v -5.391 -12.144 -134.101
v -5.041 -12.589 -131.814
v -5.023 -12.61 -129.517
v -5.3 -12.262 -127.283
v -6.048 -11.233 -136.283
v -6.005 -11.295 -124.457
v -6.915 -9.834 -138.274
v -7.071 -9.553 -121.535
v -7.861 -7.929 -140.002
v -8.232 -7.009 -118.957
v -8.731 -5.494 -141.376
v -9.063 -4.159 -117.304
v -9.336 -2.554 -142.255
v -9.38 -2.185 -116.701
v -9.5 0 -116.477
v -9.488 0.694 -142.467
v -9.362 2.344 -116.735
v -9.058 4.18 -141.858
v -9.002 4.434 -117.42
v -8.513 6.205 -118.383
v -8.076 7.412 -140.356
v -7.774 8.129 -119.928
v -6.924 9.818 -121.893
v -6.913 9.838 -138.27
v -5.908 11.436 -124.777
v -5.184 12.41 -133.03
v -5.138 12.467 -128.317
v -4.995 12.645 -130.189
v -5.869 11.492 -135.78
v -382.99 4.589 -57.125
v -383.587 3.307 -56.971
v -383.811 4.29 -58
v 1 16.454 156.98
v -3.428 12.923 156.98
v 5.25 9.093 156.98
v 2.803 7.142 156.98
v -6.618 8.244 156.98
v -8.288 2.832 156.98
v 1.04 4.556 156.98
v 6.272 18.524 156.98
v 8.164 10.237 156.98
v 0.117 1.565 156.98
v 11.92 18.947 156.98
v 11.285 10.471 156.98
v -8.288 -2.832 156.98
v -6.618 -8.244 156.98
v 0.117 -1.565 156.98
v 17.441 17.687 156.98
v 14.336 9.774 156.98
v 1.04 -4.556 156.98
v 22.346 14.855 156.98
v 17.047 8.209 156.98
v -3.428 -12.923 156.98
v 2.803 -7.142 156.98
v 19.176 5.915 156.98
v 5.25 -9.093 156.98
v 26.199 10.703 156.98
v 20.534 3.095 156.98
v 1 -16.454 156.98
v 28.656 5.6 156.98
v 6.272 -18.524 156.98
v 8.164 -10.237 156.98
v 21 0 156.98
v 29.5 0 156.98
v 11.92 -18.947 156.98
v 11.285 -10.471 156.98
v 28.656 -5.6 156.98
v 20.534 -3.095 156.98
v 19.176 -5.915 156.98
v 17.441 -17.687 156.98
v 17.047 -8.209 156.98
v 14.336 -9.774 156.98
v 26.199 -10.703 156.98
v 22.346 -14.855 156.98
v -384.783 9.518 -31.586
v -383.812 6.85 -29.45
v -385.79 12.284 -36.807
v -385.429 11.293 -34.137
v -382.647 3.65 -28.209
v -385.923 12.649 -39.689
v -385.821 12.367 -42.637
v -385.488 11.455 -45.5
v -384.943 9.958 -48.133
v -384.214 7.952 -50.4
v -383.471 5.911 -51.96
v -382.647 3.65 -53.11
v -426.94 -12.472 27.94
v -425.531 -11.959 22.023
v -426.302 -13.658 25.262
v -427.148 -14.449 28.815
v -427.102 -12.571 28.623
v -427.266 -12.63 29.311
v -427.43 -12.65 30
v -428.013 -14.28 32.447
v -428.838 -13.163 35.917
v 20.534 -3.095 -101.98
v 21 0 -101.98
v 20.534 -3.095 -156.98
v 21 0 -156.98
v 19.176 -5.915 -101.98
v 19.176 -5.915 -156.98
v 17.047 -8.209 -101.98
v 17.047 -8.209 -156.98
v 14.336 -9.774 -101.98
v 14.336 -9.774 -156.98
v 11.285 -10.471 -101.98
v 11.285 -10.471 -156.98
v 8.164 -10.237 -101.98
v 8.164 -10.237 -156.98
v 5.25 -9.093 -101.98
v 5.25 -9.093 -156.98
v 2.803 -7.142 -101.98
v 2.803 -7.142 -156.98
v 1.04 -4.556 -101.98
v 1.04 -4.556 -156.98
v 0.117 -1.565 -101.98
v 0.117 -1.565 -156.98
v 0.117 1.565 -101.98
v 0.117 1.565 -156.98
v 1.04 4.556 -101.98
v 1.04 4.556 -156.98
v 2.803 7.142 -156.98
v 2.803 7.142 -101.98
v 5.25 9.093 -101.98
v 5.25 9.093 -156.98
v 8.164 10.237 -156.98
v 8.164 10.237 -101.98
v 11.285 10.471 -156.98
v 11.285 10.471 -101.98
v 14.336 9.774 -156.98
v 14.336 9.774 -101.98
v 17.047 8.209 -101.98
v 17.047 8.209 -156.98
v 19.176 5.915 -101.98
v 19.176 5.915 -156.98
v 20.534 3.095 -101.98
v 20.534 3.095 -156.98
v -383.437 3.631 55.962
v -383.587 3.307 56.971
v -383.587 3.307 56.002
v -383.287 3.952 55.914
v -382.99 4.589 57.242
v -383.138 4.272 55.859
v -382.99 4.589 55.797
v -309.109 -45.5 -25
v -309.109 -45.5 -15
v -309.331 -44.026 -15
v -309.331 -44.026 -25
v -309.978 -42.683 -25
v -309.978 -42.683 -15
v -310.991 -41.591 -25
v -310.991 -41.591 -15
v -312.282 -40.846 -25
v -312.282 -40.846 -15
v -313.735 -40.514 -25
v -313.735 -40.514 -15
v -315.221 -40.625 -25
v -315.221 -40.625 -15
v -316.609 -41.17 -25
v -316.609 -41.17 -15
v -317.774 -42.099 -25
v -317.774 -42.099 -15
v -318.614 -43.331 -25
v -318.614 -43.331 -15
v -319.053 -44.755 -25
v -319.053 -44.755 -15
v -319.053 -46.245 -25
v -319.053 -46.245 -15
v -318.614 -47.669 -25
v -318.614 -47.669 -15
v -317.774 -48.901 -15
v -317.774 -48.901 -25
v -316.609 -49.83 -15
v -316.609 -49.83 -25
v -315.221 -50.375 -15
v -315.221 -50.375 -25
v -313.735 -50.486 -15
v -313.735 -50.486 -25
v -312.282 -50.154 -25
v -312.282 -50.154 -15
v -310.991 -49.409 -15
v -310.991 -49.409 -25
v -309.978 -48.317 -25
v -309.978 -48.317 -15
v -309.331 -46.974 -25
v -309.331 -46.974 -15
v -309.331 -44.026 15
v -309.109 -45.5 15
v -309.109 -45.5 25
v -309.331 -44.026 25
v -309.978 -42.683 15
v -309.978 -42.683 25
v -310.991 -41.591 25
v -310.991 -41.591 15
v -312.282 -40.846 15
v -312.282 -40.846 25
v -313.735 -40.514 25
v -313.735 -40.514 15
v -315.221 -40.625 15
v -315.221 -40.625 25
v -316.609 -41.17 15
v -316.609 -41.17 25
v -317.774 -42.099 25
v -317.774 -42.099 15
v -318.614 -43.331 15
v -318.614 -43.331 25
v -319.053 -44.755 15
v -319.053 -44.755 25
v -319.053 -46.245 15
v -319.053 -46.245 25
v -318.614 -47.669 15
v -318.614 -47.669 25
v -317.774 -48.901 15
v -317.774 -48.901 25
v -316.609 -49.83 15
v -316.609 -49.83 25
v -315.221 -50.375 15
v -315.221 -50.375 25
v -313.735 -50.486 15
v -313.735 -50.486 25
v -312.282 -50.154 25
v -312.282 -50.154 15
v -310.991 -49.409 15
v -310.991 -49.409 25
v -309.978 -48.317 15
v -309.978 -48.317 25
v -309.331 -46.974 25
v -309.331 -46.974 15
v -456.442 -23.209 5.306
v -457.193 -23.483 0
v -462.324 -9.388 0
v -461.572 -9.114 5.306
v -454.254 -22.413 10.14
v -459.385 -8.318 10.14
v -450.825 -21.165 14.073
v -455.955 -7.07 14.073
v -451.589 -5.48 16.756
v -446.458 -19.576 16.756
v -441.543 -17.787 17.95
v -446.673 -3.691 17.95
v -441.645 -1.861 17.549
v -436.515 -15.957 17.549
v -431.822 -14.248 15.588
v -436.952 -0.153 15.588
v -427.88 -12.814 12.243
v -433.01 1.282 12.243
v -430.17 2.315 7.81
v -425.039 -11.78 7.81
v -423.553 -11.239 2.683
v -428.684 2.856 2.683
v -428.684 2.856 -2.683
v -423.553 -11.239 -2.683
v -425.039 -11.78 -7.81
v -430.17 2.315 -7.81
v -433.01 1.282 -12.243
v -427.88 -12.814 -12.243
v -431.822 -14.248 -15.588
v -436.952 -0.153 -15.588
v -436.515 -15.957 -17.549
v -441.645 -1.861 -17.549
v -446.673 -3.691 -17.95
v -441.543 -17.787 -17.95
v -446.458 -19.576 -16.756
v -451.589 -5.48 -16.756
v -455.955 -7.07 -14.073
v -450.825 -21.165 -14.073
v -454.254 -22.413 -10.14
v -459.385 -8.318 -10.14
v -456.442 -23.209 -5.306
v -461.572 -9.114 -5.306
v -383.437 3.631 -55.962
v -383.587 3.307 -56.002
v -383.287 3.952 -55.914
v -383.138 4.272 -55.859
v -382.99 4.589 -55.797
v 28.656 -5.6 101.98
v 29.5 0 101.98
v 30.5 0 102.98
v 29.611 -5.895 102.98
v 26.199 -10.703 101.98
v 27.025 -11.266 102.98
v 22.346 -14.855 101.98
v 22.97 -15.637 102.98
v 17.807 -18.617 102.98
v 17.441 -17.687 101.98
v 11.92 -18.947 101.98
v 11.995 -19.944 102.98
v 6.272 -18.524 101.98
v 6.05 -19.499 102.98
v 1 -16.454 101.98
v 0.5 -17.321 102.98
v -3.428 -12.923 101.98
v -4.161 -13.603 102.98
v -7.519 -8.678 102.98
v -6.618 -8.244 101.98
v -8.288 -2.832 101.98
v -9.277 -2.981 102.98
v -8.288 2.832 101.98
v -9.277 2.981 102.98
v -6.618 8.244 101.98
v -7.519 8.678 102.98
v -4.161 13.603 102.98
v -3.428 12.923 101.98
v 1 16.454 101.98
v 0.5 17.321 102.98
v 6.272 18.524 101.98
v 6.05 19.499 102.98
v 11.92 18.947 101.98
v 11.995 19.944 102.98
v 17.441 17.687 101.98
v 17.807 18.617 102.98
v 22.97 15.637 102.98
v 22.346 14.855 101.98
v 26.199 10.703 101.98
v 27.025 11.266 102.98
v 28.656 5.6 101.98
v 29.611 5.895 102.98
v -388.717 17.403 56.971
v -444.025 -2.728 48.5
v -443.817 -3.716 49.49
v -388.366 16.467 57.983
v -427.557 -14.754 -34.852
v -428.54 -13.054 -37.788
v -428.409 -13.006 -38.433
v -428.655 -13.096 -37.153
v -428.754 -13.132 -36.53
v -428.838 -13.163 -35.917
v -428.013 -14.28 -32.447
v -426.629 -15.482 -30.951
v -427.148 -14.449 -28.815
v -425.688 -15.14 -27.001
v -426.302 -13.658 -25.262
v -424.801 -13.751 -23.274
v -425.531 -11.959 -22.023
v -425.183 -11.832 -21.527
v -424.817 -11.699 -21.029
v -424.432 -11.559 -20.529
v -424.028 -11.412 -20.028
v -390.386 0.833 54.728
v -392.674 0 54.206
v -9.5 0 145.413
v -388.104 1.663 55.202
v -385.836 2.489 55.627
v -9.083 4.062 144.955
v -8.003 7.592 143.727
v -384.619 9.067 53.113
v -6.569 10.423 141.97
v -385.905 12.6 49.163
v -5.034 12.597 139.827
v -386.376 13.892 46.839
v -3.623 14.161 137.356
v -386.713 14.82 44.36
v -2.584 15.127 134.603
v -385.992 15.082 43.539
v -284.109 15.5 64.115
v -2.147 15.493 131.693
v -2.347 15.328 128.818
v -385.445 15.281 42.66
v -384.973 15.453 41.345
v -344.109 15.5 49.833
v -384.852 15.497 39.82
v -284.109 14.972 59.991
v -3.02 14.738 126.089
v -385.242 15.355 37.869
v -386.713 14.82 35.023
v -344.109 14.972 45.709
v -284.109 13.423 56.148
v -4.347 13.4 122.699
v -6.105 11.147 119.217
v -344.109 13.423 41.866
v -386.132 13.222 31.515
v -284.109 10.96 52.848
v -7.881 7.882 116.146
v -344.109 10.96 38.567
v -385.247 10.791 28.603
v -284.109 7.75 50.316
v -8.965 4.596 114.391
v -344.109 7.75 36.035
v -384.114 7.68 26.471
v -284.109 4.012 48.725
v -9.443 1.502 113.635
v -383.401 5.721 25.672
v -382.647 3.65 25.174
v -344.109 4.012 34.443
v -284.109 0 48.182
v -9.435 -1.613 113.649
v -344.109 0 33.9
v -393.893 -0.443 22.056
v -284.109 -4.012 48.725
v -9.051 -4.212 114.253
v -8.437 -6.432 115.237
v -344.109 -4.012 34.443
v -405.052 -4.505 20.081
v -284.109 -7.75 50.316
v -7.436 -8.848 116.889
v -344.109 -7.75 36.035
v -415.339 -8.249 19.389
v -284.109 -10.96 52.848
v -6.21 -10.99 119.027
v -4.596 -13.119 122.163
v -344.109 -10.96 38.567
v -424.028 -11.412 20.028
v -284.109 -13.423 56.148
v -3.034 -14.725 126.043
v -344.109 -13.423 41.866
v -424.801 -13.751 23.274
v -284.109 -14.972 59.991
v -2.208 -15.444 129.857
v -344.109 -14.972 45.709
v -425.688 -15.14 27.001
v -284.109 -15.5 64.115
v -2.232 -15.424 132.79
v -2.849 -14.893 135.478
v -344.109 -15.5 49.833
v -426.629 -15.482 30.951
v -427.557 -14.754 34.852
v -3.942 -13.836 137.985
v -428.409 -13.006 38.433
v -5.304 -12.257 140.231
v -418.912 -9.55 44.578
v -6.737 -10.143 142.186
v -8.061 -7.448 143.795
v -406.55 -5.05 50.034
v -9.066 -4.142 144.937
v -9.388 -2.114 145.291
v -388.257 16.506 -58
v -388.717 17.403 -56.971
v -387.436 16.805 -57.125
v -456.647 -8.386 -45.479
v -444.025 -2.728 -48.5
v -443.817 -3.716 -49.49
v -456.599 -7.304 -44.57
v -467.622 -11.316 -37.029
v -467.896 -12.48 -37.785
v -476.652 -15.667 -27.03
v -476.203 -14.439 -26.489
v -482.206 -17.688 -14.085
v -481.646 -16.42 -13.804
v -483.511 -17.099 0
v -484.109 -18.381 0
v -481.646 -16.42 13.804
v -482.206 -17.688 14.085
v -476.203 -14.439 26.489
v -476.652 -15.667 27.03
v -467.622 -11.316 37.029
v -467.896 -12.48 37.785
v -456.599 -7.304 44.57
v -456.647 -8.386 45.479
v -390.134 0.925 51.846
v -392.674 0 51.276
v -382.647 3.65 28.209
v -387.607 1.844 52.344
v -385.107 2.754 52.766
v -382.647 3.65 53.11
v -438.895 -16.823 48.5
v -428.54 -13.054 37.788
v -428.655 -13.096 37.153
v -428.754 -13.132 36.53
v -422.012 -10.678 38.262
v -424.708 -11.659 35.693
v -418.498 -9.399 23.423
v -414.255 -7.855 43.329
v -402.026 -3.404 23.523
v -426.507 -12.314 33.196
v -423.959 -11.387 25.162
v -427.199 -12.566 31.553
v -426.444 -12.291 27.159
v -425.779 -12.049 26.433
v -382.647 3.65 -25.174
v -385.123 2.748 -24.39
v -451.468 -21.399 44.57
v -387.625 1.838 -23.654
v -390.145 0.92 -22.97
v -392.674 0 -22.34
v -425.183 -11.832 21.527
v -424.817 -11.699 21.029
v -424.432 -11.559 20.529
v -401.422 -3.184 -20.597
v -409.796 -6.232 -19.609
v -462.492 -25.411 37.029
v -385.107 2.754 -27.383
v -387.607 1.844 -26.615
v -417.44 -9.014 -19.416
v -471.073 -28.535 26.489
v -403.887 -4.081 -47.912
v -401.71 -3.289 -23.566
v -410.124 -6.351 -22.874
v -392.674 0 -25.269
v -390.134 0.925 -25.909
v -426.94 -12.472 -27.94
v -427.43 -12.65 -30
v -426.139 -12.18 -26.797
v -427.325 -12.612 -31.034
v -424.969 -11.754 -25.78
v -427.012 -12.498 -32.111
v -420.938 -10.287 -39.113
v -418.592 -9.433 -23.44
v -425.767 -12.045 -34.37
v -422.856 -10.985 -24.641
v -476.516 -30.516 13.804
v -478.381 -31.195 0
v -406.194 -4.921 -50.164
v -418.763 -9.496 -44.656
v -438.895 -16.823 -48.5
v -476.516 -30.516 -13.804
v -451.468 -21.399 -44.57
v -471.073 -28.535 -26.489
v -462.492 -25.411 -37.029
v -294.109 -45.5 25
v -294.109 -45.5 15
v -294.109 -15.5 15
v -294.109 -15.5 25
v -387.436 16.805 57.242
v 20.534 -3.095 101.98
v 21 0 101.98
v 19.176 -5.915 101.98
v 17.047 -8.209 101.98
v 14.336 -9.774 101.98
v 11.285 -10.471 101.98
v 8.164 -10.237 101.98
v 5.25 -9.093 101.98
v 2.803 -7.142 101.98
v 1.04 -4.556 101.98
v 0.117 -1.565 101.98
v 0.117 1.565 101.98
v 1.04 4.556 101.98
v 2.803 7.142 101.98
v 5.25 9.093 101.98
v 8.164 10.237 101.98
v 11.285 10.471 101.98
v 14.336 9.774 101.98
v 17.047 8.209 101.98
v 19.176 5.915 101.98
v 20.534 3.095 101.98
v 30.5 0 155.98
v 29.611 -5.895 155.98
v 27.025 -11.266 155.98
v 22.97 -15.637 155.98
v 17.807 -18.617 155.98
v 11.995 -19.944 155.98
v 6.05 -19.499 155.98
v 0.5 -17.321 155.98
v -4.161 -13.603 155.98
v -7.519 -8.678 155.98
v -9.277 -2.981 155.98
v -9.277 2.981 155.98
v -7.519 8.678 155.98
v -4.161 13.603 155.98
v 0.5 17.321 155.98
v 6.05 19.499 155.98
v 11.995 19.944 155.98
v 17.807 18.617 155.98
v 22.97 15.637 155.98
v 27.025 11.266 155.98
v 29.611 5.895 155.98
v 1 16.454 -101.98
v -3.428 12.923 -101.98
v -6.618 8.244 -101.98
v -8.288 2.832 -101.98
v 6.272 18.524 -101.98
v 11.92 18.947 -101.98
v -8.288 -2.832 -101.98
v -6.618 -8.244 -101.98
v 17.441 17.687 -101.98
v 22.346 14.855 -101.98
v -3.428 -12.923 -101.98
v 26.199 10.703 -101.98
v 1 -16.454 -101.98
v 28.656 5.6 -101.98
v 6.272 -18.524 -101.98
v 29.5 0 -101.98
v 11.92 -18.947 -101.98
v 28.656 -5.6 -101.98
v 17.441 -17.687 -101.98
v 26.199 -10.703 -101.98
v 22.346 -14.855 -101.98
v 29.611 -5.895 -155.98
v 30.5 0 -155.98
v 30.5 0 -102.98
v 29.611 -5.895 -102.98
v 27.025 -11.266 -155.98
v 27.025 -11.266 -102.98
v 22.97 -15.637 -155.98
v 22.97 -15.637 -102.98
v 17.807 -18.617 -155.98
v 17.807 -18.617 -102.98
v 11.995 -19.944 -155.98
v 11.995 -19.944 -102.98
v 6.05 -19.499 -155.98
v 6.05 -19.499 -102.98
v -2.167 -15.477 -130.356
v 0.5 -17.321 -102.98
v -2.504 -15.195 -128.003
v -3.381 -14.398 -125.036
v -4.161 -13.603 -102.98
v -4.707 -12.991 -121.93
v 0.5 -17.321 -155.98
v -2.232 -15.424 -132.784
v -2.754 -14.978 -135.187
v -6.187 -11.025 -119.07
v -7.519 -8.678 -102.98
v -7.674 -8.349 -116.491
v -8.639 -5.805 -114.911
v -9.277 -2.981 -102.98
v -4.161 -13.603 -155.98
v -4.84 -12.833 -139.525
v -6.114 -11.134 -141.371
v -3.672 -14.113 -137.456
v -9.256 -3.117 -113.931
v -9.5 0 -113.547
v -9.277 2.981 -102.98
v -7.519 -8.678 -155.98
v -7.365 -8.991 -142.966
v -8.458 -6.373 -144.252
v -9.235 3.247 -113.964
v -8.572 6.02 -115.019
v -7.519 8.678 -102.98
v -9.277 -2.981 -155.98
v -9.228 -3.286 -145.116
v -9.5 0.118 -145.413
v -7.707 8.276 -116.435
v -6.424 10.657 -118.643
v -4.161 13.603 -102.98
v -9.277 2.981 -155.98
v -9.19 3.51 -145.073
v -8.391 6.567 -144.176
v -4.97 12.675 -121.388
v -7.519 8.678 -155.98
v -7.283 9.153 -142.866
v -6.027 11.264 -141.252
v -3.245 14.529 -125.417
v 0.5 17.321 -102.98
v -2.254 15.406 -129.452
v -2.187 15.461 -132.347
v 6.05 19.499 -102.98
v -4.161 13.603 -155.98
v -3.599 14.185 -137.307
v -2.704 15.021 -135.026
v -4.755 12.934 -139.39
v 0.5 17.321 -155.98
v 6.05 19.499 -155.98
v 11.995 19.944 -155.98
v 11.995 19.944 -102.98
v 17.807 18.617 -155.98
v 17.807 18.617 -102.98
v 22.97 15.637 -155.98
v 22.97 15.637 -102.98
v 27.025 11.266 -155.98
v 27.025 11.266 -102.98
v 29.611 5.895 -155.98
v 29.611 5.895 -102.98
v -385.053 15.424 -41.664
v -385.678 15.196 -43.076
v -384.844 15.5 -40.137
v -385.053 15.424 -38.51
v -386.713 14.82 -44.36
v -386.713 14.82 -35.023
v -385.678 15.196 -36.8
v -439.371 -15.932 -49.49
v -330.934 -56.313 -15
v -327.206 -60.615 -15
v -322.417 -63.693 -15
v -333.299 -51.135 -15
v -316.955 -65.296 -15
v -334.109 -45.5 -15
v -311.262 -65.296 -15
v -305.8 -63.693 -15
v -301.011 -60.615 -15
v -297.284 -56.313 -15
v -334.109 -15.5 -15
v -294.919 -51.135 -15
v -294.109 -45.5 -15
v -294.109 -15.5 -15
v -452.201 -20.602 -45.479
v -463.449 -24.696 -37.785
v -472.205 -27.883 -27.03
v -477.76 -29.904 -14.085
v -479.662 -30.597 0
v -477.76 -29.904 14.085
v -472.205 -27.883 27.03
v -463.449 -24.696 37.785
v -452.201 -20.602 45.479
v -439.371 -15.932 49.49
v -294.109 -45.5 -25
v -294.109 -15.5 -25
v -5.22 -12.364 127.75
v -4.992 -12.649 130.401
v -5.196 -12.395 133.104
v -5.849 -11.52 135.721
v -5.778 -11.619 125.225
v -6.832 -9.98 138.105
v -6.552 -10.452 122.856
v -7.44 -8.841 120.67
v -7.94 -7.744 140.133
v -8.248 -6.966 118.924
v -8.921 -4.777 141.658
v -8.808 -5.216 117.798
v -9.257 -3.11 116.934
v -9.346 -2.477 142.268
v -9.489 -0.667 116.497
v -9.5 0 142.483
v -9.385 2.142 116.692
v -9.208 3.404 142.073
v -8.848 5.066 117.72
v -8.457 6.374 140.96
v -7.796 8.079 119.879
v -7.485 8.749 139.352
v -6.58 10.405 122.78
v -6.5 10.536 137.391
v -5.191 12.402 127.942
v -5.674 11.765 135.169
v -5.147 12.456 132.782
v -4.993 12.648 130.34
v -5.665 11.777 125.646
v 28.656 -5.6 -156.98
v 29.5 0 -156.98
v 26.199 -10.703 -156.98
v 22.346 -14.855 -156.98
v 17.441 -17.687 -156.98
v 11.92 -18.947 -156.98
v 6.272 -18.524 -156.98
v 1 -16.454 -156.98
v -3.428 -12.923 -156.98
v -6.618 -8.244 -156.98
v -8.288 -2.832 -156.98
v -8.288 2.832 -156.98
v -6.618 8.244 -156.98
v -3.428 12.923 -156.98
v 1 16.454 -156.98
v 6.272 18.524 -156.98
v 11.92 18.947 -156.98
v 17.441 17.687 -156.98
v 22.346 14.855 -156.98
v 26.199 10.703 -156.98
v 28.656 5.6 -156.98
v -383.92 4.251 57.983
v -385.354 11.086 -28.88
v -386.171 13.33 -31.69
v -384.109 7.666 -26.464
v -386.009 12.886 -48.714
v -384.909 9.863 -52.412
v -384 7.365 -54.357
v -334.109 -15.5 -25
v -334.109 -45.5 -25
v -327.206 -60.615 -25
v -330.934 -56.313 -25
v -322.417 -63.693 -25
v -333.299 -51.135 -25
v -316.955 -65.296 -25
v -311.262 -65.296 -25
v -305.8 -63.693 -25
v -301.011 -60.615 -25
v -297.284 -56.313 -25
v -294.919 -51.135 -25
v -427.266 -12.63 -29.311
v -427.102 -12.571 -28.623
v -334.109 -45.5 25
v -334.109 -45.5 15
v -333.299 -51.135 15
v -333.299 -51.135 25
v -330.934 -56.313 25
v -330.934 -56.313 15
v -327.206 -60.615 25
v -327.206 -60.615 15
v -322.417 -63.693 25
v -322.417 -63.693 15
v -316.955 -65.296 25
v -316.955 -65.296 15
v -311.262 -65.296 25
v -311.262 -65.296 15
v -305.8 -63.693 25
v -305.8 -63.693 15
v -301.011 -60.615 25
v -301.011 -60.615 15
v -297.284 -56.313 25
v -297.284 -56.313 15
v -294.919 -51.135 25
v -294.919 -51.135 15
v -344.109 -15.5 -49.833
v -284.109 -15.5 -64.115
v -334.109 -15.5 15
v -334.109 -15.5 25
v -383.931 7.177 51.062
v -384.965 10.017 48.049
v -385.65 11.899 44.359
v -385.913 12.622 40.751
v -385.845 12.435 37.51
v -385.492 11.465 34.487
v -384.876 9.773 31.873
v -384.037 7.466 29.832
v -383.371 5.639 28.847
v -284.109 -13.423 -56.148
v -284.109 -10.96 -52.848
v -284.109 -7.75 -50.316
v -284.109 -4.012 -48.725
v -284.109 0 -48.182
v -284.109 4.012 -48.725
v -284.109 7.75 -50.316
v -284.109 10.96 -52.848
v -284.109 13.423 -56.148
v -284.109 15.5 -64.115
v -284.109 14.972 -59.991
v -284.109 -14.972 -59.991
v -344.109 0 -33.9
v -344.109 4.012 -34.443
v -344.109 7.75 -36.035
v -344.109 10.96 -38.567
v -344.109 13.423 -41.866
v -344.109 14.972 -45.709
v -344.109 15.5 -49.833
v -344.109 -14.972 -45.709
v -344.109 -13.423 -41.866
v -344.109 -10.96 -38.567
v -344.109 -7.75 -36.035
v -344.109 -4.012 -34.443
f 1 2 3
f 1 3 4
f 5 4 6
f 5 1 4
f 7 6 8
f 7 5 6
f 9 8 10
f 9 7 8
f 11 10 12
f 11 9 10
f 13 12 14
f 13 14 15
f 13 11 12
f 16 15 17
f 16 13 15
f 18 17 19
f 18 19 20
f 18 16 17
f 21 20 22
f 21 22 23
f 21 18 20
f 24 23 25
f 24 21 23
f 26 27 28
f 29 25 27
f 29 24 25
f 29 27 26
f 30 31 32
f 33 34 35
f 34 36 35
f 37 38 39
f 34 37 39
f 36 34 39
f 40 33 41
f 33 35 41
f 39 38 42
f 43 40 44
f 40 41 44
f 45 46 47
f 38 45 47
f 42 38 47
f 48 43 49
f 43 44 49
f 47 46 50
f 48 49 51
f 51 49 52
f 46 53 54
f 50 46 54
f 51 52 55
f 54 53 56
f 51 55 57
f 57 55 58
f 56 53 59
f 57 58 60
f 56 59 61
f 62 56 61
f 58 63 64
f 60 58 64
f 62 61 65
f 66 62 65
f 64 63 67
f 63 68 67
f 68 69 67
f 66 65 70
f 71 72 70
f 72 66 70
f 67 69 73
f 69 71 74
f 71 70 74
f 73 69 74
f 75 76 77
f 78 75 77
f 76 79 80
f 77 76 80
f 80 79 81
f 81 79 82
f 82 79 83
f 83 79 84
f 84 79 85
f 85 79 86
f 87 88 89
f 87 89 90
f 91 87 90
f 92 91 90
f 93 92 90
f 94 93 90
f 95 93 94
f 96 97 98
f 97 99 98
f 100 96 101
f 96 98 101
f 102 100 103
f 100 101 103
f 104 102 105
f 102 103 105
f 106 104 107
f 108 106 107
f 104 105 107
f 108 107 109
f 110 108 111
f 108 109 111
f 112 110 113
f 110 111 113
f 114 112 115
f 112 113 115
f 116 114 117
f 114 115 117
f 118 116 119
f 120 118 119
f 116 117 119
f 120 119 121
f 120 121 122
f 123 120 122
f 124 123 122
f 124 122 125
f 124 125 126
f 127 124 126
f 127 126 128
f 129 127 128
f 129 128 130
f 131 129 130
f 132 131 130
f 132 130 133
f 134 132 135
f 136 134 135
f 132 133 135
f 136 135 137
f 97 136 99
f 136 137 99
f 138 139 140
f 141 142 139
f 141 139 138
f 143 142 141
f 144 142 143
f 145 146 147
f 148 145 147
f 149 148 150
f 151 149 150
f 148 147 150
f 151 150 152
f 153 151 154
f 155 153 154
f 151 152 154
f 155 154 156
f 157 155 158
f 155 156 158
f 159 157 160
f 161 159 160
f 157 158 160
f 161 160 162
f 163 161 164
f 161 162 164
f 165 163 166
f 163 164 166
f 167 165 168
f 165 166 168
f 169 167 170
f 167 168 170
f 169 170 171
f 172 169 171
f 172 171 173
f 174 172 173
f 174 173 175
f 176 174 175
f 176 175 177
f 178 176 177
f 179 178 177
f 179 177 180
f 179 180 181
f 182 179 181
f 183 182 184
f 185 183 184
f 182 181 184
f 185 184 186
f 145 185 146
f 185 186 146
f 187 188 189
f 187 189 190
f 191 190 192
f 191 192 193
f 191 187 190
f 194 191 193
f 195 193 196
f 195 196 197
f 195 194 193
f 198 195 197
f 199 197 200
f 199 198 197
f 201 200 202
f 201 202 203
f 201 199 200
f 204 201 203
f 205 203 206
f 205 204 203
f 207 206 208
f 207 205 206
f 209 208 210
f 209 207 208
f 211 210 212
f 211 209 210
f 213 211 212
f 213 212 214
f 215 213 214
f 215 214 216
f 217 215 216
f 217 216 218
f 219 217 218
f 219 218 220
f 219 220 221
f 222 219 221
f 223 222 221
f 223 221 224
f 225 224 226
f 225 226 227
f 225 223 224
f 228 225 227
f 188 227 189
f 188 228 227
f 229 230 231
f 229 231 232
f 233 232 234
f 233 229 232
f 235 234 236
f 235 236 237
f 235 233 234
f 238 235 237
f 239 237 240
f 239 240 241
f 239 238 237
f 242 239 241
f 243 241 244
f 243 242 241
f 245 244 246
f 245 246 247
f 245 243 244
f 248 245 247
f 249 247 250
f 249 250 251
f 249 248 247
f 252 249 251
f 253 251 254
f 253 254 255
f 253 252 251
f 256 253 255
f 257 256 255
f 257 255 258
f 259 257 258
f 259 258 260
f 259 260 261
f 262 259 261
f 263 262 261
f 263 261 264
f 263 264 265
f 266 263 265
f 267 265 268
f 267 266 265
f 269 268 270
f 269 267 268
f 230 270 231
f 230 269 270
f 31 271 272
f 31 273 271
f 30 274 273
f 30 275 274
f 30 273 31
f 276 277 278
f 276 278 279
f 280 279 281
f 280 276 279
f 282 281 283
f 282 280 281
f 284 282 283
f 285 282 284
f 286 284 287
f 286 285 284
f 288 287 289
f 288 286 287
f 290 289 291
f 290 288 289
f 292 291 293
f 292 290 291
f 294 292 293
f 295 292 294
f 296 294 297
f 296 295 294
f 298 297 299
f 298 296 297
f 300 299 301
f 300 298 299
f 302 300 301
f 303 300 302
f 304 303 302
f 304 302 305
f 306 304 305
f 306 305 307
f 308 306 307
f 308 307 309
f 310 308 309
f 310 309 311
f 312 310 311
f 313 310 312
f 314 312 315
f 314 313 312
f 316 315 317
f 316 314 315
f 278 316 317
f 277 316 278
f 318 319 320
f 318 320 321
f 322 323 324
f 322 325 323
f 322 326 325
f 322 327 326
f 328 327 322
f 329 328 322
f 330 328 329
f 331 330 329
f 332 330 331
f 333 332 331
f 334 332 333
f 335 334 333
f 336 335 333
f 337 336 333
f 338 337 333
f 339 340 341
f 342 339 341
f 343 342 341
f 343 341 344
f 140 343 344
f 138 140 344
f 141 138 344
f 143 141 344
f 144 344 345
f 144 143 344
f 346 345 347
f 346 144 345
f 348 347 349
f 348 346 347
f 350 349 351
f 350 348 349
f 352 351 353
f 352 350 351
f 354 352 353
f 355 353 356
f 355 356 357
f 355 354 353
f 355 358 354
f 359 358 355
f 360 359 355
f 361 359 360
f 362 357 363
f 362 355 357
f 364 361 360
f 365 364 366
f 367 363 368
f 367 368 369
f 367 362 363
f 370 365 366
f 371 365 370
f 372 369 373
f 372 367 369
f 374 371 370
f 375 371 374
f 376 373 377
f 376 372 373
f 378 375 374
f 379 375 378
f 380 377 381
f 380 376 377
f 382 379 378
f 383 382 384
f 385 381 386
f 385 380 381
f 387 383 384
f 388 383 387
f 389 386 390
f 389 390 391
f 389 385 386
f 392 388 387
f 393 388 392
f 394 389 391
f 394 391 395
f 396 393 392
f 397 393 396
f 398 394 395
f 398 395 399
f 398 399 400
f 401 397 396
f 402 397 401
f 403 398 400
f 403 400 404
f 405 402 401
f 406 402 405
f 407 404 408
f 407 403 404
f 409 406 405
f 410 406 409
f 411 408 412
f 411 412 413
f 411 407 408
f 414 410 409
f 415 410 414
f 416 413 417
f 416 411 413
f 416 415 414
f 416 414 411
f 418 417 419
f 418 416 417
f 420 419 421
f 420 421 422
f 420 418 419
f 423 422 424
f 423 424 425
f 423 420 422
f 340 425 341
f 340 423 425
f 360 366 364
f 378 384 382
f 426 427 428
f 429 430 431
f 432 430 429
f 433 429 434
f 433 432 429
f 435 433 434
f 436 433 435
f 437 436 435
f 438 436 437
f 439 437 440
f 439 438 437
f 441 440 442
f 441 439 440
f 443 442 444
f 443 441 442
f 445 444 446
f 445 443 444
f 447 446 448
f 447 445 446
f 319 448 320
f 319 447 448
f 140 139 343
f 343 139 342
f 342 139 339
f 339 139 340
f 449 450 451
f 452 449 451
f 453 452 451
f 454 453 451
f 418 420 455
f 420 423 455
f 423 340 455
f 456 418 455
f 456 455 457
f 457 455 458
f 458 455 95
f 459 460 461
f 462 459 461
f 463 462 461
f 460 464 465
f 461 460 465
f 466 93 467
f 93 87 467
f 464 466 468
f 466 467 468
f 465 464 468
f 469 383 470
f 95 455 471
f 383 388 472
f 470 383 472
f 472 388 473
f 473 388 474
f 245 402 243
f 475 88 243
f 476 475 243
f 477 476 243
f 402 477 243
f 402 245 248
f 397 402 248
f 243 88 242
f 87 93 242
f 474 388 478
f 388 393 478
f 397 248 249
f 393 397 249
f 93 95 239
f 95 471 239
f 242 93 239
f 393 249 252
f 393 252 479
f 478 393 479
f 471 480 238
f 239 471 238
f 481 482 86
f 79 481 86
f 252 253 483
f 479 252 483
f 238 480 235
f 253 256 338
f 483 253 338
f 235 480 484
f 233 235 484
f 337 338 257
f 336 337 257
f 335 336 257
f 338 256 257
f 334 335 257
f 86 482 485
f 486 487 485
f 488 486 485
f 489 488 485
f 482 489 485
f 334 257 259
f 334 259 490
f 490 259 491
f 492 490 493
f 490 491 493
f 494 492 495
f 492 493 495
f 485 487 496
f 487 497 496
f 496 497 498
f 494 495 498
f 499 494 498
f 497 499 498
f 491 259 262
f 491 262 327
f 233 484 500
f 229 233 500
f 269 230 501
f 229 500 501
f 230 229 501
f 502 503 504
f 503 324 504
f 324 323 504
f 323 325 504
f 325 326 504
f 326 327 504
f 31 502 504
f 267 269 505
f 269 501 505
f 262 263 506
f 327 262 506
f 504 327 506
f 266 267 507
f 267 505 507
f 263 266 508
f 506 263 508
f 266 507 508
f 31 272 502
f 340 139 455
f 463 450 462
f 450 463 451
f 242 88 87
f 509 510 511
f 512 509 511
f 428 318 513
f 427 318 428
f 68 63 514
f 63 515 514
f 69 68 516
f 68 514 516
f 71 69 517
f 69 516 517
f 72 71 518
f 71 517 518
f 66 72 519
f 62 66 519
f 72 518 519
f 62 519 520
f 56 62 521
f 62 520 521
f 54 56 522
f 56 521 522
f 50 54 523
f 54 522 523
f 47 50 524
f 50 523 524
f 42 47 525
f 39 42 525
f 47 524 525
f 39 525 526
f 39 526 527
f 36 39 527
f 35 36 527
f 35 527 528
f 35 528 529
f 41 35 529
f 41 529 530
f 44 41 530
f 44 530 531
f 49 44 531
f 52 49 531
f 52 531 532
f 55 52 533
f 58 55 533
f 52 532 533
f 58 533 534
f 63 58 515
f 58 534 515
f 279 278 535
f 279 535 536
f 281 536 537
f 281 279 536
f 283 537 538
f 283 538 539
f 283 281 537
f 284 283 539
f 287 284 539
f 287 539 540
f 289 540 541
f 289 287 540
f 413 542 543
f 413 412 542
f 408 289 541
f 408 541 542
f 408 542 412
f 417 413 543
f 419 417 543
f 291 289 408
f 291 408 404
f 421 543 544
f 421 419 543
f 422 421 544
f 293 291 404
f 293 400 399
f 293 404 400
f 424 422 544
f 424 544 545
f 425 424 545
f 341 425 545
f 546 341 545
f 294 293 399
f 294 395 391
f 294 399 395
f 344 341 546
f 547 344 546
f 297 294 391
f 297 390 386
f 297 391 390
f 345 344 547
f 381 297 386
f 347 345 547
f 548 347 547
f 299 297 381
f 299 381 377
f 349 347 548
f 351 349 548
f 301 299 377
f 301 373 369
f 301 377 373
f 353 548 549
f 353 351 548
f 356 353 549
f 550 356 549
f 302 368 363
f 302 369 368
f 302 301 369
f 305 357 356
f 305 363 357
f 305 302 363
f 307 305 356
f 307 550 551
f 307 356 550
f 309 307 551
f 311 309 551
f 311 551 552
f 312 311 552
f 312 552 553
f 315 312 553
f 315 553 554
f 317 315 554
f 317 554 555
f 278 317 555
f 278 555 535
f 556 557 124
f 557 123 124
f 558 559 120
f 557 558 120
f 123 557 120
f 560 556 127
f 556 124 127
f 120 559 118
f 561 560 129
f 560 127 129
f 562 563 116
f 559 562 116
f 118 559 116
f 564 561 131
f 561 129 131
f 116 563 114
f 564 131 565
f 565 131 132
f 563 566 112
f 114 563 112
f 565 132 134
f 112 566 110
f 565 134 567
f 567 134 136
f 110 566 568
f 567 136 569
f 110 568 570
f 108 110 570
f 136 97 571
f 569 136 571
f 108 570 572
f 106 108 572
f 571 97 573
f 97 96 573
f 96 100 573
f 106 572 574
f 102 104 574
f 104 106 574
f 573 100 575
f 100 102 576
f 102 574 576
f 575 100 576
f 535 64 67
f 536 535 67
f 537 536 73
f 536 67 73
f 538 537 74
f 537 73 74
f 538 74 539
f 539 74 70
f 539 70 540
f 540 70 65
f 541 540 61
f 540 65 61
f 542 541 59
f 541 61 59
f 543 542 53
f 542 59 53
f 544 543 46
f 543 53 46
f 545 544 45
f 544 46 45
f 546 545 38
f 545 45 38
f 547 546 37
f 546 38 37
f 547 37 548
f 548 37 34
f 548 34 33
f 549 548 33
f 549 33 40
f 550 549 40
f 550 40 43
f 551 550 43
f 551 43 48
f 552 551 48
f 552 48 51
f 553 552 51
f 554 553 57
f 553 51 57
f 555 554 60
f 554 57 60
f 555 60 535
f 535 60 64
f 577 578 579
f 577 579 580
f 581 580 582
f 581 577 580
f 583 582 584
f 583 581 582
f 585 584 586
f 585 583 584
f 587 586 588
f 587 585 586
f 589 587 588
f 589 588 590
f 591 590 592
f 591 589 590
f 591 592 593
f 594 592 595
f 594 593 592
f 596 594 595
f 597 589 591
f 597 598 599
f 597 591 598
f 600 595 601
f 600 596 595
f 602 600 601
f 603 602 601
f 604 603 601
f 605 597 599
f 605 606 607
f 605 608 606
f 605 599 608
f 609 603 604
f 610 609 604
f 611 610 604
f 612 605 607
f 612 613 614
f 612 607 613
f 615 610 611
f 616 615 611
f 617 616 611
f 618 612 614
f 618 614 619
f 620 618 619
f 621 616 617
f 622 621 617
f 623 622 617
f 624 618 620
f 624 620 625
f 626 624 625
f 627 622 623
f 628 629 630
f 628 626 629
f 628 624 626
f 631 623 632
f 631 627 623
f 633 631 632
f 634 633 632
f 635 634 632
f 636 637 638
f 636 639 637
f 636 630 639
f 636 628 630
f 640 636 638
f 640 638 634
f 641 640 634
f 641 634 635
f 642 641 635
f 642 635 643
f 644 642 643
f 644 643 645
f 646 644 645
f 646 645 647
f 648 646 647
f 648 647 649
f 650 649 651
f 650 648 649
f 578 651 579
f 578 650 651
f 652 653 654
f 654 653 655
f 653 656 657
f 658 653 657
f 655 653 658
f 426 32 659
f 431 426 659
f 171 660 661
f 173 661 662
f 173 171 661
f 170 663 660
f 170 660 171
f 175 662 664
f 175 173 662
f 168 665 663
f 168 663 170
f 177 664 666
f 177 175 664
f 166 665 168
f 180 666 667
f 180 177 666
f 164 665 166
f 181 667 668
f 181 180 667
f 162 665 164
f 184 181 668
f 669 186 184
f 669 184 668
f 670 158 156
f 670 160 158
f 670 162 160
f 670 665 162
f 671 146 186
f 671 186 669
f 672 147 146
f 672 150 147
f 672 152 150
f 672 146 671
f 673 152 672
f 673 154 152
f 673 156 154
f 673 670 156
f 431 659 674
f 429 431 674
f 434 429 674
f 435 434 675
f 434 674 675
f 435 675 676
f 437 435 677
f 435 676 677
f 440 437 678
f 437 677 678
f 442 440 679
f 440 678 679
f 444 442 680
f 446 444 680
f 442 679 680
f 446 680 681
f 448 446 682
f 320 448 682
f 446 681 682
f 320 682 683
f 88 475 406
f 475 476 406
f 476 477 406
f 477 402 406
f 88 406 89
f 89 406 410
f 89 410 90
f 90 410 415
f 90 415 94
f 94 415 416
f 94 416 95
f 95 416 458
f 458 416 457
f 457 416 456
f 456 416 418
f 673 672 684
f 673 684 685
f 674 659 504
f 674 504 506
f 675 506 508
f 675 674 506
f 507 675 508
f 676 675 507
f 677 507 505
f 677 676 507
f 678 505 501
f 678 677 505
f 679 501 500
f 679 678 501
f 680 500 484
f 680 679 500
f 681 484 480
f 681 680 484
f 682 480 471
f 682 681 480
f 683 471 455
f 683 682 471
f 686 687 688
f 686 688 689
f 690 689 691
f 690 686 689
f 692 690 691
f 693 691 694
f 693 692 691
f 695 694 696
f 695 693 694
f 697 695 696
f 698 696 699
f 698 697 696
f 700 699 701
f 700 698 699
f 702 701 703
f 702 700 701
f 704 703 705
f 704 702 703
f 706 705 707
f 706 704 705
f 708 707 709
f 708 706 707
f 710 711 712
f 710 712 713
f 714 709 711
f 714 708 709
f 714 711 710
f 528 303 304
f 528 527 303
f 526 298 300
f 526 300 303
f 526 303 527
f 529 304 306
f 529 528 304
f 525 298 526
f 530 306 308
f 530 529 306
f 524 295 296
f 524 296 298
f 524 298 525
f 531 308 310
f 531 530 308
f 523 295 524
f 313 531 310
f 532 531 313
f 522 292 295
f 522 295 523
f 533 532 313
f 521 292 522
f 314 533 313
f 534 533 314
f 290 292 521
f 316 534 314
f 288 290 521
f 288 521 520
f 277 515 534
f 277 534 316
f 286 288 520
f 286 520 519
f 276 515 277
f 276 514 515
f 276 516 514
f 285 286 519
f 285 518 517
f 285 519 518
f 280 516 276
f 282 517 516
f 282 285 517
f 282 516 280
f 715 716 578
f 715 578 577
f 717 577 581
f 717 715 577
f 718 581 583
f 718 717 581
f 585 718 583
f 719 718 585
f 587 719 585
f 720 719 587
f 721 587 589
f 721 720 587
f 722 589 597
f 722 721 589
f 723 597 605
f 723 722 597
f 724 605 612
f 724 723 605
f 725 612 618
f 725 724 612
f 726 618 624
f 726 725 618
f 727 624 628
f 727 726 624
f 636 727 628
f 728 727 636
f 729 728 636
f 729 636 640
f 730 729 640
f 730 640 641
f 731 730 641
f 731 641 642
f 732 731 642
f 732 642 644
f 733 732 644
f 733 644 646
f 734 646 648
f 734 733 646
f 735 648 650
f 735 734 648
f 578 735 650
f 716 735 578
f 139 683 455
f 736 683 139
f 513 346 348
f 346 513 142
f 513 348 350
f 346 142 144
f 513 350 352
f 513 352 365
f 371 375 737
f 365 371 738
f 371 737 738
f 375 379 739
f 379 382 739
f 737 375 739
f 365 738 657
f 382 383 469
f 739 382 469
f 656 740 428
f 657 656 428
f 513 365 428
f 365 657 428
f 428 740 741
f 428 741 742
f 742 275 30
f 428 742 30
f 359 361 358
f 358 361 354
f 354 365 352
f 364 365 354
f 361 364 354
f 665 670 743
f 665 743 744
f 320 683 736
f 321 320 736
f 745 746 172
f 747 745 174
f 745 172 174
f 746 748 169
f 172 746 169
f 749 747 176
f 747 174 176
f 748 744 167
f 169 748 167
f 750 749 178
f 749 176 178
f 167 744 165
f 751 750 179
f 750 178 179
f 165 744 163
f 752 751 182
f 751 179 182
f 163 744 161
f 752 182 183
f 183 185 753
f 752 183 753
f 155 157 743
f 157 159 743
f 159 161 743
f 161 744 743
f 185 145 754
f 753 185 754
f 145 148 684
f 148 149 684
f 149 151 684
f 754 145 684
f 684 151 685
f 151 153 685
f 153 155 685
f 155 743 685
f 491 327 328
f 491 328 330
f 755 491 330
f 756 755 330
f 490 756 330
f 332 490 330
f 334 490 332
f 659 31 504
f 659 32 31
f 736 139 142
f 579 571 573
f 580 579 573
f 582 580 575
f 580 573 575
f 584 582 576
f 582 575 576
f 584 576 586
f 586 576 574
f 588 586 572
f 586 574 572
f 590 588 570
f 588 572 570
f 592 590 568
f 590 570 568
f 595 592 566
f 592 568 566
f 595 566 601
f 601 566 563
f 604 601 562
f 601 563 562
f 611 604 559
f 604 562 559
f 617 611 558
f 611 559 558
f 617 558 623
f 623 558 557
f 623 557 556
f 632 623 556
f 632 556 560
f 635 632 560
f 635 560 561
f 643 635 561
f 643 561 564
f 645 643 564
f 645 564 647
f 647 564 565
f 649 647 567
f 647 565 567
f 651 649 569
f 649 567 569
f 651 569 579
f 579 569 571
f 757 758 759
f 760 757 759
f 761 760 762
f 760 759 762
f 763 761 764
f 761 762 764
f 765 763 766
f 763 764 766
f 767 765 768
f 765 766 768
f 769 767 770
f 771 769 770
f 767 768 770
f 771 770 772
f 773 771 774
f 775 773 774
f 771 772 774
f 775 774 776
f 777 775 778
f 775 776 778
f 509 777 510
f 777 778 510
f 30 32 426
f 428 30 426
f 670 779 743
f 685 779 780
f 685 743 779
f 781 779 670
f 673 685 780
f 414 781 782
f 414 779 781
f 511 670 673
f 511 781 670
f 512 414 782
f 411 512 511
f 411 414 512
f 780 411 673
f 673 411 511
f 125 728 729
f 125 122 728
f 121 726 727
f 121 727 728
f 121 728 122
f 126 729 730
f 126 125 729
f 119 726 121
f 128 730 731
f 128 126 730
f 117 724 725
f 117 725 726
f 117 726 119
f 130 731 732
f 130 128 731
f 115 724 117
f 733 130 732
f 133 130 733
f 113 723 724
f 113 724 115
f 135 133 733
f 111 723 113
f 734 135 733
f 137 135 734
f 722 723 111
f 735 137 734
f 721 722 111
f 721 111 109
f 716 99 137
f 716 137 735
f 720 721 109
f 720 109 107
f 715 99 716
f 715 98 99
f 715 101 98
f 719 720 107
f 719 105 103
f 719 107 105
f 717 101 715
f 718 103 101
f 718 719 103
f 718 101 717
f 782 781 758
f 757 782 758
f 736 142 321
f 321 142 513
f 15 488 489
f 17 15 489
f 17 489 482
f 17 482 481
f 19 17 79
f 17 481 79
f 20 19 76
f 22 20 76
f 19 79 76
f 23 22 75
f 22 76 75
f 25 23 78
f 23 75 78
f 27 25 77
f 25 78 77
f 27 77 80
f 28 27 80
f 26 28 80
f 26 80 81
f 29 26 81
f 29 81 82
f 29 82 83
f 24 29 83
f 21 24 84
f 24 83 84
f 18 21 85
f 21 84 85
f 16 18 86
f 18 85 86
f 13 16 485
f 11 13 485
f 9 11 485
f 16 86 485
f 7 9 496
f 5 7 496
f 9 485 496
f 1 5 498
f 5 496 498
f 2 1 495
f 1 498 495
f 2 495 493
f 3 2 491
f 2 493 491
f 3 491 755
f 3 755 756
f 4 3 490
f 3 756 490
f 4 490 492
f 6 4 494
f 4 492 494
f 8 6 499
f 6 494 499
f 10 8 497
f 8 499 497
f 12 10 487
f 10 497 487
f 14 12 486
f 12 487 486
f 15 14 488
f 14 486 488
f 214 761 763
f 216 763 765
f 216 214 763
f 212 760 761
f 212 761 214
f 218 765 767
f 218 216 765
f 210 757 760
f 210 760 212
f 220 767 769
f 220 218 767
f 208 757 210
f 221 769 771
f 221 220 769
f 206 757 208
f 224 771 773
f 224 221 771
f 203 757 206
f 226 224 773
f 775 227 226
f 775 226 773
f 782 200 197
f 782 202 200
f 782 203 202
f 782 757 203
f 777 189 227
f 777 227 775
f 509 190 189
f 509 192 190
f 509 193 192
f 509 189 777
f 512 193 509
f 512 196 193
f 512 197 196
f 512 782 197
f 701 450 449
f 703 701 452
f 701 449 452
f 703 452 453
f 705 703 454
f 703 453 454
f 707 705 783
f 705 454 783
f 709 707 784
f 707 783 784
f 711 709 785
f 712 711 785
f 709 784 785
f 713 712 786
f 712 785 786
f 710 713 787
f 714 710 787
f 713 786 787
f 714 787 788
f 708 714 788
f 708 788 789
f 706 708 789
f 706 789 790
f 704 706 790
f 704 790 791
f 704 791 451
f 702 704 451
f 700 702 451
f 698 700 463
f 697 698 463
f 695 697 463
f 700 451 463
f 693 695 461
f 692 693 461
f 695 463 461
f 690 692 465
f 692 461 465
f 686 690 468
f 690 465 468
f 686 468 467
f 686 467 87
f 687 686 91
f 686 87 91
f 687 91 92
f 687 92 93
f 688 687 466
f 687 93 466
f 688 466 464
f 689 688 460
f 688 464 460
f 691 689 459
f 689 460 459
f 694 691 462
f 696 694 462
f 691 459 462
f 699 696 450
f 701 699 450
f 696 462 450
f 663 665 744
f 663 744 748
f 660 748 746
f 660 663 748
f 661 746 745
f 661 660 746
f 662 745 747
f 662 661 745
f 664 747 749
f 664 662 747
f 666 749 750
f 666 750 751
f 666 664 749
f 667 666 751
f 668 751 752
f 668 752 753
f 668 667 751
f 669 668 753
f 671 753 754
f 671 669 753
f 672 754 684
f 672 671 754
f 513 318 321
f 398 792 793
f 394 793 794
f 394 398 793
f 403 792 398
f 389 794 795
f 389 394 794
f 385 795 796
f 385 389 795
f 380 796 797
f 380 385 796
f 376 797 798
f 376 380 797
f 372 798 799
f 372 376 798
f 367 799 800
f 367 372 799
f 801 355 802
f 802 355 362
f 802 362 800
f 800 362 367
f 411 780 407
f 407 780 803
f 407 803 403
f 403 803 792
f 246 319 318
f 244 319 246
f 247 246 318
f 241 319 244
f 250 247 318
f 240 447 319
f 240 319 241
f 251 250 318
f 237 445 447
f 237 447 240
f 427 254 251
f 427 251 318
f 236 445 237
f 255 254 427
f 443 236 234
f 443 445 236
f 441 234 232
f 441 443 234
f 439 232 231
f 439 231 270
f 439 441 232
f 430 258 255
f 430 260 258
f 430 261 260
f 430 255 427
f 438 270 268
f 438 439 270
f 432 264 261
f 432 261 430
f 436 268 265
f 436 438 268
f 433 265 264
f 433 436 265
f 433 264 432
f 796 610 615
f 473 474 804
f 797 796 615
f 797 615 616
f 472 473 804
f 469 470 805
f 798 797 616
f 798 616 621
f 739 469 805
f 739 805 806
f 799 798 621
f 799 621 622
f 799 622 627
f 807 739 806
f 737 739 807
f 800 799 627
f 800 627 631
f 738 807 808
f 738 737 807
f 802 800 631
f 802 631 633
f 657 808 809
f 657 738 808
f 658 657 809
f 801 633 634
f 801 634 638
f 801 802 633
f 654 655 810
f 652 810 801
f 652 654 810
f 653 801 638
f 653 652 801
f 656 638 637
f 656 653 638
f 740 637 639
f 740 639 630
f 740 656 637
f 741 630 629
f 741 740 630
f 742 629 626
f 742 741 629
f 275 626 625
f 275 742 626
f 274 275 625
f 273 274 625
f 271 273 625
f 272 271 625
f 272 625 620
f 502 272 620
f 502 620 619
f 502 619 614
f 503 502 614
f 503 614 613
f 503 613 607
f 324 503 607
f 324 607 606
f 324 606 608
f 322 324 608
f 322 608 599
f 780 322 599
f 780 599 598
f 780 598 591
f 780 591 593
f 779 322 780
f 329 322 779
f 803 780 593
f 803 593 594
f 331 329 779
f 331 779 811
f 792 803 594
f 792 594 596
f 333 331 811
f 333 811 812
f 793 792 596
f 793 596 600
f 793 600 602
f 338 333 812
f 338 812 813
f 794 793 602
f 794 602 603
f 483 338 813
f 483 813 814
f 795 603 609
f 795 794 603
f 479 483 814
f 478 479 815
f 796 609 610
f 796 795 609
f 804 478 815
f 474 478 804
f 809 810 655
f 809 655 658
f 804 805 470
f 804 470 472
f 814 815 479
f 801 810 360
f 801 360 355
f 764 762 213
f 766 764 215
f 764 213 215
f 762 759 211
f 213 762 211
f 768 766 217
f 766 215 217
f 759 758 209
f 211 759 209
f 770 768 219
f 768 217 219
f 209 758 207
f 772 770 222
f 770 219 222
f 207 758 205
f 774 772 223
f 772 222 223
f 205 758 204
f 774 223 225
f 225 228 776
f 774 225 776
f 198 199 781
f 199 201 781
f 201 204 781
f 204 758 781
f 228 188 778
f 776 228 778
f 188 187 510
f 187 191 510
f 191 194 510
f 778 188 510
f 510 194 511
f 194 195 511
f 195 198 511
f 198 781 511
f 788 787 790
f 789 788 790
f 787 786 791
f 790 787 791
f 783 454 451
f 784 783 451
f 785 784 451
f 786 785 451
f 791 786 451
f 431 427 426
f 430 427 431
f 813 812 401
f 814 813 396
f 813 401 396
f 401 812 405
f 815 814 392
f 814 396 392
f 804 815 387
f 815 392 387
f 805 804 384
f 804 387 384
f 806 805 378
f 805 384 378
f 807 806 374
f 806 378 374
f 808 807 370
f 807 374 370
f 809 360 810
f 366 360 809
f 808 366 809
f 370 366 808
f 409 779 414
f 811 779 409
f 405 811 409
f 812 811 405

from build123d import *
from OCP.BRepFilletAPI import BRepFilletAPI_MakeChamfer

# Parameters (mm, degrees)
SKETCH1_W                            = 9.5
SKETCH1_H                            = 55
BOSS_EXTRUDE1_REACH                  = 497.037
BOSS_EXTRUDE1_END_RADIUS             = 20
SKETCH2_R                            = 15.5
SKETCH2_R_2                          = 12.65
BOSS_EXTRUDE2_REACH                  = 497.037
BOSS_EXTRUDE2_END_RADIUS             = 20
SKETCH3_R                            = 15.5
SKETCH3_R_2                          = 12.65
SKETCH9_W                            = 200
SKETCH9_H                            = 33.234380704
CUT_EXTRUDE2_DEPTH                   = 198.5
SKETCH8_R                            = 18
BOSS_EXTRUDE3_DEPTH                  = 15
CHAMFER1_SIZE                        = 1
CHAMFER2_SIZE                        = 1
CHAMFER2_SIZE2                       = 0.883191486
BOSS_EXTRUDE5_REACH                  = 511.879
BOSS_EXTRUDE5_END_RADIUS             = 15.5
SKETCH13_W                           = 60
SKETCH13_H                           = 31
BOSS_EXTRUDE5_DIRECTION_2_REACH      = 511.879
BOSS_EXTRUDE5_DIRECTION_2_END_RADIUS = 15.5
CHAMFER4_SIZE                        = 1
SKETCH19_R                           = 5
BOSS_EXTRUDE7_DEPTH                  = 10


with BuildPart() as part:
    # Sketch1 → Revolve1 (revolve)
    with BuildSketch(Plane(origin=(0, 0, 0), x_dir=(1, 0, 0), z_dir=(0, 1, 0)), mode=Mode.PRIVATE) as revolve1_sk:
        with Locations((-4.75, 129.48)):
            Rectangle(SKETCH1_W, SKETCH1_H)
        with Locations((-4.75, -129.48)):
            Rectangle(SKETCH1_W, SKETCH1_H)
    revolve(revolve1_sk.sketch.rotate(Axis((10.5, 0, -101.98), (0, 0, -1)), 180), axis=Axis((10.5, 0, -101.98), (0, 0, -1)))

    # Boss-Extrude1: up to this cylinder (the profile starts outside it)
    boss_extrude1_end = Plane(origin=(10.5, 0, -44.652226), z_dir=(0, 0, 1)) * Cylinder(BOSS_EXTRUDE1_END_RADIUS, 1035.074, mode=Mode.PRIVATE)
    # Sketch2 → Boss-Extrude1 (add, up to the surface)
    with BuildSketch(Plane(origin=(-427.43, 0, -30), x_dir=(0.2315607356536785, 0, 0.9728204488514453), z_dir=(-0.9728204488514451, 0, 0.23156073565367846)), mode=Mode.PRIVATE) as boss_extrude1_sk1:
        Circle(SKETCH2_R)
        Circle(SKETCH2_R_2, mode=Mode.SUBTRACT)
    boss_extrude1_tool1 = extrude(boss_extrude1_sk1.sketch, amount=-BOSS_EXTRUDE1_REACH, mode=Mode.PRIVATE) - boss_extrude1_end
    add(boss_extrude1_tool1.solids().sort_by_distance((-430.917674, 0, -44.652226))[0])

    # Boss-Extrude2: up to this cylinder (the profile starts outside it)
    boss_extrude2_end = Plane(origin=(10.5, 0, 15.347774), z_dir=(0, 0, 1)) * Cylinder(BOSS_EXTRUDE2_END_RADIUS, 1035.074, mode=Mode.PRIVATE)
    # Sketch3 → Boss-Extrude2 (add, up to the surface)
    with BuildSketch(Plane(origin=(-427.43, 0, 30), x_dir=(-0.23156073565367818, 0, 0.9728204488514453), z_dir=(-0.9728204488514453, 0, -0.23156073565367818)), mode=Mode.PRIVATE) as boss_extrude2_sk1:
        Circle(SKETCH3_R)
        Circle(SKETCH3_R_2, mode=Mode.SUBTRACT)
    boss_extrude2_tool1 = extrude(boss_extrude2_sk1.sketch, amount=-BOSS_EXTRUDE2_REACH, mode=Mode.PRIVATE) - boss_extrude2_end
    add(boss_extrude2_tool1.solids().sort_by_distance((-423.942326, 0, 15.347774))[0])

    # Sketch9 → Cut-Extrude2 (cut, symmetric)
    with BuildSketch(Plane(origin=(-377.430188161, -137.373354004, 0), x_dir=(0, 0, 1), z_dir=(-0.9396926207859128, -0.34202014332565694, 0))):
        with Locations((0, 162.806860214)):
            Rectangle(SKETCH9_W, SKETCH9_H)
    extrude(amount=CUT_EXTRUDE2_DEPTH, both=True, mode=Mode.SUBTRACT)

    # Sketch8 → Boss-Extrude3 (add)
    with BuildSketch(Plane(origin=(-45.934180208, 126.203122901, 0), x_dir=(0, 0, -1), z_dir=(-0.34202014332565694, 0.9396926207859128, 1.048381213421869e-15))):
        with BuildLine():
            Line((-58.125498382, 358.322816903), (58.125498382, 358.322816903))
            Line((58.125498382, 358.322816903), (49.490055464, 418.322816903))
            ThreePointArc((49.490055464, 418.322816903), (0, 461.200007753), (-49.490055464, 418.322816903))
            Line((-49.490055464, 418.322816903), (-58.125498382, 358.322816903))
        make_face()
        with Locations(Location((0, 419.652816903, 0), (0, 0, 90))):
            Circle(SKETCH8_R, mode=Mode.SUBTRACT)
    extrude(amount=BOSS_EXTRUDE3_DEPTH)

    # Chamfer1
    chamfer1_edges = [part.edges().sort_by_distance(p)[0] for p in [
        (-9.5, 0, -156.98),
        (-9.5, 0, -101.98),
        (-9.5, 0, 101.98),
        (-9.5, 0, 156.98),
    ]]
    chamfer(chamfer1_edges, length=CHAMFER1_SIZE)

    # Chamfer2: one chamfer whose edges measure the first distance from different faces: ONE call of the kernel's chamfer builder (chamfer() names one face for all edges)
    chamfer2_edges_1 = [part.edges().sort_by_distance(p)[0] for p in [
        (-385.212638185, 10.697196363, 58.125498382),
    ]]
    chamfer2_side_1 = [part.faces().sort_by_distance(p)[0] for p in [
        (-413.403416809, 0.436592064, 53.807776923),
    ]]
    chamfer2_edges_2 = [part.edges().sort_by_distance(p)[0] for p in [
        (-385.212638185, 10.697196363, -58.125498382),
    ]]
    chamfer2_side_2 = [part.faces().sort_by_distance(p)[0] for p in [
        (-385.604654849, 11.774253296, 0),
    ]]
    chamfer2_edges_3 = [part.edges().sort_by_distance(p)[0] for p in [
        (-387.77778926, 17.744891019, 0),
        (-415.968567884, 7.48428672, 53.807776923),
        (-415.968567884, 7.48428672, -53.807776923),
        (-484.450726349, -17.44118054, 0),
        (-382.64748711, 3.649501708, 57.135102558),
        (-410.838265734, -6.611102592, 53.807776923),
        (-410.838265734, -6.611102592, -53.807776923),
        (-479.320424199, -31.536569852, 0),
        (-382.64748711, 3.649501708, -57.135102558),
    ]]
    chamfer2 = BRepFilletAPI_MakeChamfer(part.part.solid().wrapped)
    for e in chamfer2_edges_1:
        chamfer2.Add(CHAMFER2_SIZE, CHAMFER2_SIZE2, e.wrapped, chamfer2_side_1[0].wrapped)  # the first distance lies on this face
    for e in chamfer2_edges_2:
        chamfer2.Add(CHAMFER2_SIZE, CHAMFER2_SIZE2, e.wrapped, chamfer2_side_2[0].wrapped)  # the first distance lies on this face
    for e in chamfer2_edges_3:
        chamfer2.Add(CHAMFER2_SIZE, e.wrapped)
    add(Compound.cast(chamfer2.Shape()), mode=Mode.REPLACE)

    # Boss-Extrude5: up to this cylinder (the profile starts outside it)
    boss_extrude5_end = Plane(origin=(-326.943046764, 0, 53.918938836), z_dir=(-0.9728204488514453, 0, -0.2315607356536782)) * Cylinder(BOSS_EXTRUDE5_END_RADIUS, 1055.758, mode=Mode.PRIVATE)
    # Sketch13 → Boss-Extrude5 (add, up to the surface)
    with BuildSketch(Plane.XY, mode=Mode.PRIVATE) as boss_extrude5_sk1:
        with Locations((-314.108706206, 0)):
            Rectangle(SKETCH13_W, SKETCH13_H)
    boss_extrude5_tool1 = extrude(boss_extrude5_sk1.sketch, amount=BOSS_EXTRUDE5_REACH, mode=Mode.PRIVATE) - boss_extrude5_end
    add(boss_extrude5_tool1.solids().sort_by_distance((-314.108706, 0, 0))[0])

    # Boss-Extrude5 direction 2: up to this cylinder (the profile starts outside it)
    boss_extrude5_direction_2_end = Plane(origin=(-326.943046764, 0, -53.918938836), z_dir=(-0.9728204488514453, 0, 0.2315607356536785)) * Cylinder(BOSS_EXTRUDE5_DIRECTION_2_END_RADIUS, 1055.758, mode=Mode.PRIVATE)
    # Sketch13 → Boss-Extrude5 direction 2 (add, up to the surface)
    with BuildSketch(Plane.XY, mode=Mode.PRIVATE) as boss_extrude5_direction_2_sk1:
        with Locations((-314.108706206, 0)):
            Rectangle(SKETCH13_W, SKETCH13_H)
    boss_extrude5_direction_2_tool1 = extrude(boss_extrude5_direction_2_sk1.sketch, amount=-BOSS_EXTRUDE5_DIRECTION_2_REACH, mode=Mode.PRIVATE) - boss_extrude5_direction_2_end
    add(boss_extrude5_direction_2_tool1.solids().sort_by_distance((-314.108706, 0, 0))[0])

    # Chamfer4
    chamfer4_edges = [part.edges().sort_by_distance(p)[0] for p in [
        (-427.12856728, -15.445240802, -28.733637145),
        (-427.12856728, -15.445240802, 28.733637145),
    ]]
    chamfer(chamfer4_edges, length=CHAMFER4_SIZE)

    # Sketch19 → Boss-Extrude7 (add)
    with BuildSketch(Plane.XY.offset(15)):
        with BuildLine():
            Line((-334.108706206, -15.5), (-334.108706206, -45.5))
            ThreePointArc((-334.108706206, -45.5), (-314.108706206, -65.5), (-294.108706206, -45.5))
            Line((-294.108706206, -45.5), (-294.108706206, -15.5))
            Line((-294.108706206, -15.5), (-334.108706206, -15.5))
        make_face()
        with Locations((-314.108706206, -45.5)):
            Circle(SKETCH19_R, mode=Mode.SUBTRACT)
    boss_extrude7 = extrude(amount=BOSS_EXTRUDE7_DEPTH)

    # Mirror2: Boss-Extrude7 across plane
    add(boss_extrude7.mirror(Plane.XY))


solid = part.part
